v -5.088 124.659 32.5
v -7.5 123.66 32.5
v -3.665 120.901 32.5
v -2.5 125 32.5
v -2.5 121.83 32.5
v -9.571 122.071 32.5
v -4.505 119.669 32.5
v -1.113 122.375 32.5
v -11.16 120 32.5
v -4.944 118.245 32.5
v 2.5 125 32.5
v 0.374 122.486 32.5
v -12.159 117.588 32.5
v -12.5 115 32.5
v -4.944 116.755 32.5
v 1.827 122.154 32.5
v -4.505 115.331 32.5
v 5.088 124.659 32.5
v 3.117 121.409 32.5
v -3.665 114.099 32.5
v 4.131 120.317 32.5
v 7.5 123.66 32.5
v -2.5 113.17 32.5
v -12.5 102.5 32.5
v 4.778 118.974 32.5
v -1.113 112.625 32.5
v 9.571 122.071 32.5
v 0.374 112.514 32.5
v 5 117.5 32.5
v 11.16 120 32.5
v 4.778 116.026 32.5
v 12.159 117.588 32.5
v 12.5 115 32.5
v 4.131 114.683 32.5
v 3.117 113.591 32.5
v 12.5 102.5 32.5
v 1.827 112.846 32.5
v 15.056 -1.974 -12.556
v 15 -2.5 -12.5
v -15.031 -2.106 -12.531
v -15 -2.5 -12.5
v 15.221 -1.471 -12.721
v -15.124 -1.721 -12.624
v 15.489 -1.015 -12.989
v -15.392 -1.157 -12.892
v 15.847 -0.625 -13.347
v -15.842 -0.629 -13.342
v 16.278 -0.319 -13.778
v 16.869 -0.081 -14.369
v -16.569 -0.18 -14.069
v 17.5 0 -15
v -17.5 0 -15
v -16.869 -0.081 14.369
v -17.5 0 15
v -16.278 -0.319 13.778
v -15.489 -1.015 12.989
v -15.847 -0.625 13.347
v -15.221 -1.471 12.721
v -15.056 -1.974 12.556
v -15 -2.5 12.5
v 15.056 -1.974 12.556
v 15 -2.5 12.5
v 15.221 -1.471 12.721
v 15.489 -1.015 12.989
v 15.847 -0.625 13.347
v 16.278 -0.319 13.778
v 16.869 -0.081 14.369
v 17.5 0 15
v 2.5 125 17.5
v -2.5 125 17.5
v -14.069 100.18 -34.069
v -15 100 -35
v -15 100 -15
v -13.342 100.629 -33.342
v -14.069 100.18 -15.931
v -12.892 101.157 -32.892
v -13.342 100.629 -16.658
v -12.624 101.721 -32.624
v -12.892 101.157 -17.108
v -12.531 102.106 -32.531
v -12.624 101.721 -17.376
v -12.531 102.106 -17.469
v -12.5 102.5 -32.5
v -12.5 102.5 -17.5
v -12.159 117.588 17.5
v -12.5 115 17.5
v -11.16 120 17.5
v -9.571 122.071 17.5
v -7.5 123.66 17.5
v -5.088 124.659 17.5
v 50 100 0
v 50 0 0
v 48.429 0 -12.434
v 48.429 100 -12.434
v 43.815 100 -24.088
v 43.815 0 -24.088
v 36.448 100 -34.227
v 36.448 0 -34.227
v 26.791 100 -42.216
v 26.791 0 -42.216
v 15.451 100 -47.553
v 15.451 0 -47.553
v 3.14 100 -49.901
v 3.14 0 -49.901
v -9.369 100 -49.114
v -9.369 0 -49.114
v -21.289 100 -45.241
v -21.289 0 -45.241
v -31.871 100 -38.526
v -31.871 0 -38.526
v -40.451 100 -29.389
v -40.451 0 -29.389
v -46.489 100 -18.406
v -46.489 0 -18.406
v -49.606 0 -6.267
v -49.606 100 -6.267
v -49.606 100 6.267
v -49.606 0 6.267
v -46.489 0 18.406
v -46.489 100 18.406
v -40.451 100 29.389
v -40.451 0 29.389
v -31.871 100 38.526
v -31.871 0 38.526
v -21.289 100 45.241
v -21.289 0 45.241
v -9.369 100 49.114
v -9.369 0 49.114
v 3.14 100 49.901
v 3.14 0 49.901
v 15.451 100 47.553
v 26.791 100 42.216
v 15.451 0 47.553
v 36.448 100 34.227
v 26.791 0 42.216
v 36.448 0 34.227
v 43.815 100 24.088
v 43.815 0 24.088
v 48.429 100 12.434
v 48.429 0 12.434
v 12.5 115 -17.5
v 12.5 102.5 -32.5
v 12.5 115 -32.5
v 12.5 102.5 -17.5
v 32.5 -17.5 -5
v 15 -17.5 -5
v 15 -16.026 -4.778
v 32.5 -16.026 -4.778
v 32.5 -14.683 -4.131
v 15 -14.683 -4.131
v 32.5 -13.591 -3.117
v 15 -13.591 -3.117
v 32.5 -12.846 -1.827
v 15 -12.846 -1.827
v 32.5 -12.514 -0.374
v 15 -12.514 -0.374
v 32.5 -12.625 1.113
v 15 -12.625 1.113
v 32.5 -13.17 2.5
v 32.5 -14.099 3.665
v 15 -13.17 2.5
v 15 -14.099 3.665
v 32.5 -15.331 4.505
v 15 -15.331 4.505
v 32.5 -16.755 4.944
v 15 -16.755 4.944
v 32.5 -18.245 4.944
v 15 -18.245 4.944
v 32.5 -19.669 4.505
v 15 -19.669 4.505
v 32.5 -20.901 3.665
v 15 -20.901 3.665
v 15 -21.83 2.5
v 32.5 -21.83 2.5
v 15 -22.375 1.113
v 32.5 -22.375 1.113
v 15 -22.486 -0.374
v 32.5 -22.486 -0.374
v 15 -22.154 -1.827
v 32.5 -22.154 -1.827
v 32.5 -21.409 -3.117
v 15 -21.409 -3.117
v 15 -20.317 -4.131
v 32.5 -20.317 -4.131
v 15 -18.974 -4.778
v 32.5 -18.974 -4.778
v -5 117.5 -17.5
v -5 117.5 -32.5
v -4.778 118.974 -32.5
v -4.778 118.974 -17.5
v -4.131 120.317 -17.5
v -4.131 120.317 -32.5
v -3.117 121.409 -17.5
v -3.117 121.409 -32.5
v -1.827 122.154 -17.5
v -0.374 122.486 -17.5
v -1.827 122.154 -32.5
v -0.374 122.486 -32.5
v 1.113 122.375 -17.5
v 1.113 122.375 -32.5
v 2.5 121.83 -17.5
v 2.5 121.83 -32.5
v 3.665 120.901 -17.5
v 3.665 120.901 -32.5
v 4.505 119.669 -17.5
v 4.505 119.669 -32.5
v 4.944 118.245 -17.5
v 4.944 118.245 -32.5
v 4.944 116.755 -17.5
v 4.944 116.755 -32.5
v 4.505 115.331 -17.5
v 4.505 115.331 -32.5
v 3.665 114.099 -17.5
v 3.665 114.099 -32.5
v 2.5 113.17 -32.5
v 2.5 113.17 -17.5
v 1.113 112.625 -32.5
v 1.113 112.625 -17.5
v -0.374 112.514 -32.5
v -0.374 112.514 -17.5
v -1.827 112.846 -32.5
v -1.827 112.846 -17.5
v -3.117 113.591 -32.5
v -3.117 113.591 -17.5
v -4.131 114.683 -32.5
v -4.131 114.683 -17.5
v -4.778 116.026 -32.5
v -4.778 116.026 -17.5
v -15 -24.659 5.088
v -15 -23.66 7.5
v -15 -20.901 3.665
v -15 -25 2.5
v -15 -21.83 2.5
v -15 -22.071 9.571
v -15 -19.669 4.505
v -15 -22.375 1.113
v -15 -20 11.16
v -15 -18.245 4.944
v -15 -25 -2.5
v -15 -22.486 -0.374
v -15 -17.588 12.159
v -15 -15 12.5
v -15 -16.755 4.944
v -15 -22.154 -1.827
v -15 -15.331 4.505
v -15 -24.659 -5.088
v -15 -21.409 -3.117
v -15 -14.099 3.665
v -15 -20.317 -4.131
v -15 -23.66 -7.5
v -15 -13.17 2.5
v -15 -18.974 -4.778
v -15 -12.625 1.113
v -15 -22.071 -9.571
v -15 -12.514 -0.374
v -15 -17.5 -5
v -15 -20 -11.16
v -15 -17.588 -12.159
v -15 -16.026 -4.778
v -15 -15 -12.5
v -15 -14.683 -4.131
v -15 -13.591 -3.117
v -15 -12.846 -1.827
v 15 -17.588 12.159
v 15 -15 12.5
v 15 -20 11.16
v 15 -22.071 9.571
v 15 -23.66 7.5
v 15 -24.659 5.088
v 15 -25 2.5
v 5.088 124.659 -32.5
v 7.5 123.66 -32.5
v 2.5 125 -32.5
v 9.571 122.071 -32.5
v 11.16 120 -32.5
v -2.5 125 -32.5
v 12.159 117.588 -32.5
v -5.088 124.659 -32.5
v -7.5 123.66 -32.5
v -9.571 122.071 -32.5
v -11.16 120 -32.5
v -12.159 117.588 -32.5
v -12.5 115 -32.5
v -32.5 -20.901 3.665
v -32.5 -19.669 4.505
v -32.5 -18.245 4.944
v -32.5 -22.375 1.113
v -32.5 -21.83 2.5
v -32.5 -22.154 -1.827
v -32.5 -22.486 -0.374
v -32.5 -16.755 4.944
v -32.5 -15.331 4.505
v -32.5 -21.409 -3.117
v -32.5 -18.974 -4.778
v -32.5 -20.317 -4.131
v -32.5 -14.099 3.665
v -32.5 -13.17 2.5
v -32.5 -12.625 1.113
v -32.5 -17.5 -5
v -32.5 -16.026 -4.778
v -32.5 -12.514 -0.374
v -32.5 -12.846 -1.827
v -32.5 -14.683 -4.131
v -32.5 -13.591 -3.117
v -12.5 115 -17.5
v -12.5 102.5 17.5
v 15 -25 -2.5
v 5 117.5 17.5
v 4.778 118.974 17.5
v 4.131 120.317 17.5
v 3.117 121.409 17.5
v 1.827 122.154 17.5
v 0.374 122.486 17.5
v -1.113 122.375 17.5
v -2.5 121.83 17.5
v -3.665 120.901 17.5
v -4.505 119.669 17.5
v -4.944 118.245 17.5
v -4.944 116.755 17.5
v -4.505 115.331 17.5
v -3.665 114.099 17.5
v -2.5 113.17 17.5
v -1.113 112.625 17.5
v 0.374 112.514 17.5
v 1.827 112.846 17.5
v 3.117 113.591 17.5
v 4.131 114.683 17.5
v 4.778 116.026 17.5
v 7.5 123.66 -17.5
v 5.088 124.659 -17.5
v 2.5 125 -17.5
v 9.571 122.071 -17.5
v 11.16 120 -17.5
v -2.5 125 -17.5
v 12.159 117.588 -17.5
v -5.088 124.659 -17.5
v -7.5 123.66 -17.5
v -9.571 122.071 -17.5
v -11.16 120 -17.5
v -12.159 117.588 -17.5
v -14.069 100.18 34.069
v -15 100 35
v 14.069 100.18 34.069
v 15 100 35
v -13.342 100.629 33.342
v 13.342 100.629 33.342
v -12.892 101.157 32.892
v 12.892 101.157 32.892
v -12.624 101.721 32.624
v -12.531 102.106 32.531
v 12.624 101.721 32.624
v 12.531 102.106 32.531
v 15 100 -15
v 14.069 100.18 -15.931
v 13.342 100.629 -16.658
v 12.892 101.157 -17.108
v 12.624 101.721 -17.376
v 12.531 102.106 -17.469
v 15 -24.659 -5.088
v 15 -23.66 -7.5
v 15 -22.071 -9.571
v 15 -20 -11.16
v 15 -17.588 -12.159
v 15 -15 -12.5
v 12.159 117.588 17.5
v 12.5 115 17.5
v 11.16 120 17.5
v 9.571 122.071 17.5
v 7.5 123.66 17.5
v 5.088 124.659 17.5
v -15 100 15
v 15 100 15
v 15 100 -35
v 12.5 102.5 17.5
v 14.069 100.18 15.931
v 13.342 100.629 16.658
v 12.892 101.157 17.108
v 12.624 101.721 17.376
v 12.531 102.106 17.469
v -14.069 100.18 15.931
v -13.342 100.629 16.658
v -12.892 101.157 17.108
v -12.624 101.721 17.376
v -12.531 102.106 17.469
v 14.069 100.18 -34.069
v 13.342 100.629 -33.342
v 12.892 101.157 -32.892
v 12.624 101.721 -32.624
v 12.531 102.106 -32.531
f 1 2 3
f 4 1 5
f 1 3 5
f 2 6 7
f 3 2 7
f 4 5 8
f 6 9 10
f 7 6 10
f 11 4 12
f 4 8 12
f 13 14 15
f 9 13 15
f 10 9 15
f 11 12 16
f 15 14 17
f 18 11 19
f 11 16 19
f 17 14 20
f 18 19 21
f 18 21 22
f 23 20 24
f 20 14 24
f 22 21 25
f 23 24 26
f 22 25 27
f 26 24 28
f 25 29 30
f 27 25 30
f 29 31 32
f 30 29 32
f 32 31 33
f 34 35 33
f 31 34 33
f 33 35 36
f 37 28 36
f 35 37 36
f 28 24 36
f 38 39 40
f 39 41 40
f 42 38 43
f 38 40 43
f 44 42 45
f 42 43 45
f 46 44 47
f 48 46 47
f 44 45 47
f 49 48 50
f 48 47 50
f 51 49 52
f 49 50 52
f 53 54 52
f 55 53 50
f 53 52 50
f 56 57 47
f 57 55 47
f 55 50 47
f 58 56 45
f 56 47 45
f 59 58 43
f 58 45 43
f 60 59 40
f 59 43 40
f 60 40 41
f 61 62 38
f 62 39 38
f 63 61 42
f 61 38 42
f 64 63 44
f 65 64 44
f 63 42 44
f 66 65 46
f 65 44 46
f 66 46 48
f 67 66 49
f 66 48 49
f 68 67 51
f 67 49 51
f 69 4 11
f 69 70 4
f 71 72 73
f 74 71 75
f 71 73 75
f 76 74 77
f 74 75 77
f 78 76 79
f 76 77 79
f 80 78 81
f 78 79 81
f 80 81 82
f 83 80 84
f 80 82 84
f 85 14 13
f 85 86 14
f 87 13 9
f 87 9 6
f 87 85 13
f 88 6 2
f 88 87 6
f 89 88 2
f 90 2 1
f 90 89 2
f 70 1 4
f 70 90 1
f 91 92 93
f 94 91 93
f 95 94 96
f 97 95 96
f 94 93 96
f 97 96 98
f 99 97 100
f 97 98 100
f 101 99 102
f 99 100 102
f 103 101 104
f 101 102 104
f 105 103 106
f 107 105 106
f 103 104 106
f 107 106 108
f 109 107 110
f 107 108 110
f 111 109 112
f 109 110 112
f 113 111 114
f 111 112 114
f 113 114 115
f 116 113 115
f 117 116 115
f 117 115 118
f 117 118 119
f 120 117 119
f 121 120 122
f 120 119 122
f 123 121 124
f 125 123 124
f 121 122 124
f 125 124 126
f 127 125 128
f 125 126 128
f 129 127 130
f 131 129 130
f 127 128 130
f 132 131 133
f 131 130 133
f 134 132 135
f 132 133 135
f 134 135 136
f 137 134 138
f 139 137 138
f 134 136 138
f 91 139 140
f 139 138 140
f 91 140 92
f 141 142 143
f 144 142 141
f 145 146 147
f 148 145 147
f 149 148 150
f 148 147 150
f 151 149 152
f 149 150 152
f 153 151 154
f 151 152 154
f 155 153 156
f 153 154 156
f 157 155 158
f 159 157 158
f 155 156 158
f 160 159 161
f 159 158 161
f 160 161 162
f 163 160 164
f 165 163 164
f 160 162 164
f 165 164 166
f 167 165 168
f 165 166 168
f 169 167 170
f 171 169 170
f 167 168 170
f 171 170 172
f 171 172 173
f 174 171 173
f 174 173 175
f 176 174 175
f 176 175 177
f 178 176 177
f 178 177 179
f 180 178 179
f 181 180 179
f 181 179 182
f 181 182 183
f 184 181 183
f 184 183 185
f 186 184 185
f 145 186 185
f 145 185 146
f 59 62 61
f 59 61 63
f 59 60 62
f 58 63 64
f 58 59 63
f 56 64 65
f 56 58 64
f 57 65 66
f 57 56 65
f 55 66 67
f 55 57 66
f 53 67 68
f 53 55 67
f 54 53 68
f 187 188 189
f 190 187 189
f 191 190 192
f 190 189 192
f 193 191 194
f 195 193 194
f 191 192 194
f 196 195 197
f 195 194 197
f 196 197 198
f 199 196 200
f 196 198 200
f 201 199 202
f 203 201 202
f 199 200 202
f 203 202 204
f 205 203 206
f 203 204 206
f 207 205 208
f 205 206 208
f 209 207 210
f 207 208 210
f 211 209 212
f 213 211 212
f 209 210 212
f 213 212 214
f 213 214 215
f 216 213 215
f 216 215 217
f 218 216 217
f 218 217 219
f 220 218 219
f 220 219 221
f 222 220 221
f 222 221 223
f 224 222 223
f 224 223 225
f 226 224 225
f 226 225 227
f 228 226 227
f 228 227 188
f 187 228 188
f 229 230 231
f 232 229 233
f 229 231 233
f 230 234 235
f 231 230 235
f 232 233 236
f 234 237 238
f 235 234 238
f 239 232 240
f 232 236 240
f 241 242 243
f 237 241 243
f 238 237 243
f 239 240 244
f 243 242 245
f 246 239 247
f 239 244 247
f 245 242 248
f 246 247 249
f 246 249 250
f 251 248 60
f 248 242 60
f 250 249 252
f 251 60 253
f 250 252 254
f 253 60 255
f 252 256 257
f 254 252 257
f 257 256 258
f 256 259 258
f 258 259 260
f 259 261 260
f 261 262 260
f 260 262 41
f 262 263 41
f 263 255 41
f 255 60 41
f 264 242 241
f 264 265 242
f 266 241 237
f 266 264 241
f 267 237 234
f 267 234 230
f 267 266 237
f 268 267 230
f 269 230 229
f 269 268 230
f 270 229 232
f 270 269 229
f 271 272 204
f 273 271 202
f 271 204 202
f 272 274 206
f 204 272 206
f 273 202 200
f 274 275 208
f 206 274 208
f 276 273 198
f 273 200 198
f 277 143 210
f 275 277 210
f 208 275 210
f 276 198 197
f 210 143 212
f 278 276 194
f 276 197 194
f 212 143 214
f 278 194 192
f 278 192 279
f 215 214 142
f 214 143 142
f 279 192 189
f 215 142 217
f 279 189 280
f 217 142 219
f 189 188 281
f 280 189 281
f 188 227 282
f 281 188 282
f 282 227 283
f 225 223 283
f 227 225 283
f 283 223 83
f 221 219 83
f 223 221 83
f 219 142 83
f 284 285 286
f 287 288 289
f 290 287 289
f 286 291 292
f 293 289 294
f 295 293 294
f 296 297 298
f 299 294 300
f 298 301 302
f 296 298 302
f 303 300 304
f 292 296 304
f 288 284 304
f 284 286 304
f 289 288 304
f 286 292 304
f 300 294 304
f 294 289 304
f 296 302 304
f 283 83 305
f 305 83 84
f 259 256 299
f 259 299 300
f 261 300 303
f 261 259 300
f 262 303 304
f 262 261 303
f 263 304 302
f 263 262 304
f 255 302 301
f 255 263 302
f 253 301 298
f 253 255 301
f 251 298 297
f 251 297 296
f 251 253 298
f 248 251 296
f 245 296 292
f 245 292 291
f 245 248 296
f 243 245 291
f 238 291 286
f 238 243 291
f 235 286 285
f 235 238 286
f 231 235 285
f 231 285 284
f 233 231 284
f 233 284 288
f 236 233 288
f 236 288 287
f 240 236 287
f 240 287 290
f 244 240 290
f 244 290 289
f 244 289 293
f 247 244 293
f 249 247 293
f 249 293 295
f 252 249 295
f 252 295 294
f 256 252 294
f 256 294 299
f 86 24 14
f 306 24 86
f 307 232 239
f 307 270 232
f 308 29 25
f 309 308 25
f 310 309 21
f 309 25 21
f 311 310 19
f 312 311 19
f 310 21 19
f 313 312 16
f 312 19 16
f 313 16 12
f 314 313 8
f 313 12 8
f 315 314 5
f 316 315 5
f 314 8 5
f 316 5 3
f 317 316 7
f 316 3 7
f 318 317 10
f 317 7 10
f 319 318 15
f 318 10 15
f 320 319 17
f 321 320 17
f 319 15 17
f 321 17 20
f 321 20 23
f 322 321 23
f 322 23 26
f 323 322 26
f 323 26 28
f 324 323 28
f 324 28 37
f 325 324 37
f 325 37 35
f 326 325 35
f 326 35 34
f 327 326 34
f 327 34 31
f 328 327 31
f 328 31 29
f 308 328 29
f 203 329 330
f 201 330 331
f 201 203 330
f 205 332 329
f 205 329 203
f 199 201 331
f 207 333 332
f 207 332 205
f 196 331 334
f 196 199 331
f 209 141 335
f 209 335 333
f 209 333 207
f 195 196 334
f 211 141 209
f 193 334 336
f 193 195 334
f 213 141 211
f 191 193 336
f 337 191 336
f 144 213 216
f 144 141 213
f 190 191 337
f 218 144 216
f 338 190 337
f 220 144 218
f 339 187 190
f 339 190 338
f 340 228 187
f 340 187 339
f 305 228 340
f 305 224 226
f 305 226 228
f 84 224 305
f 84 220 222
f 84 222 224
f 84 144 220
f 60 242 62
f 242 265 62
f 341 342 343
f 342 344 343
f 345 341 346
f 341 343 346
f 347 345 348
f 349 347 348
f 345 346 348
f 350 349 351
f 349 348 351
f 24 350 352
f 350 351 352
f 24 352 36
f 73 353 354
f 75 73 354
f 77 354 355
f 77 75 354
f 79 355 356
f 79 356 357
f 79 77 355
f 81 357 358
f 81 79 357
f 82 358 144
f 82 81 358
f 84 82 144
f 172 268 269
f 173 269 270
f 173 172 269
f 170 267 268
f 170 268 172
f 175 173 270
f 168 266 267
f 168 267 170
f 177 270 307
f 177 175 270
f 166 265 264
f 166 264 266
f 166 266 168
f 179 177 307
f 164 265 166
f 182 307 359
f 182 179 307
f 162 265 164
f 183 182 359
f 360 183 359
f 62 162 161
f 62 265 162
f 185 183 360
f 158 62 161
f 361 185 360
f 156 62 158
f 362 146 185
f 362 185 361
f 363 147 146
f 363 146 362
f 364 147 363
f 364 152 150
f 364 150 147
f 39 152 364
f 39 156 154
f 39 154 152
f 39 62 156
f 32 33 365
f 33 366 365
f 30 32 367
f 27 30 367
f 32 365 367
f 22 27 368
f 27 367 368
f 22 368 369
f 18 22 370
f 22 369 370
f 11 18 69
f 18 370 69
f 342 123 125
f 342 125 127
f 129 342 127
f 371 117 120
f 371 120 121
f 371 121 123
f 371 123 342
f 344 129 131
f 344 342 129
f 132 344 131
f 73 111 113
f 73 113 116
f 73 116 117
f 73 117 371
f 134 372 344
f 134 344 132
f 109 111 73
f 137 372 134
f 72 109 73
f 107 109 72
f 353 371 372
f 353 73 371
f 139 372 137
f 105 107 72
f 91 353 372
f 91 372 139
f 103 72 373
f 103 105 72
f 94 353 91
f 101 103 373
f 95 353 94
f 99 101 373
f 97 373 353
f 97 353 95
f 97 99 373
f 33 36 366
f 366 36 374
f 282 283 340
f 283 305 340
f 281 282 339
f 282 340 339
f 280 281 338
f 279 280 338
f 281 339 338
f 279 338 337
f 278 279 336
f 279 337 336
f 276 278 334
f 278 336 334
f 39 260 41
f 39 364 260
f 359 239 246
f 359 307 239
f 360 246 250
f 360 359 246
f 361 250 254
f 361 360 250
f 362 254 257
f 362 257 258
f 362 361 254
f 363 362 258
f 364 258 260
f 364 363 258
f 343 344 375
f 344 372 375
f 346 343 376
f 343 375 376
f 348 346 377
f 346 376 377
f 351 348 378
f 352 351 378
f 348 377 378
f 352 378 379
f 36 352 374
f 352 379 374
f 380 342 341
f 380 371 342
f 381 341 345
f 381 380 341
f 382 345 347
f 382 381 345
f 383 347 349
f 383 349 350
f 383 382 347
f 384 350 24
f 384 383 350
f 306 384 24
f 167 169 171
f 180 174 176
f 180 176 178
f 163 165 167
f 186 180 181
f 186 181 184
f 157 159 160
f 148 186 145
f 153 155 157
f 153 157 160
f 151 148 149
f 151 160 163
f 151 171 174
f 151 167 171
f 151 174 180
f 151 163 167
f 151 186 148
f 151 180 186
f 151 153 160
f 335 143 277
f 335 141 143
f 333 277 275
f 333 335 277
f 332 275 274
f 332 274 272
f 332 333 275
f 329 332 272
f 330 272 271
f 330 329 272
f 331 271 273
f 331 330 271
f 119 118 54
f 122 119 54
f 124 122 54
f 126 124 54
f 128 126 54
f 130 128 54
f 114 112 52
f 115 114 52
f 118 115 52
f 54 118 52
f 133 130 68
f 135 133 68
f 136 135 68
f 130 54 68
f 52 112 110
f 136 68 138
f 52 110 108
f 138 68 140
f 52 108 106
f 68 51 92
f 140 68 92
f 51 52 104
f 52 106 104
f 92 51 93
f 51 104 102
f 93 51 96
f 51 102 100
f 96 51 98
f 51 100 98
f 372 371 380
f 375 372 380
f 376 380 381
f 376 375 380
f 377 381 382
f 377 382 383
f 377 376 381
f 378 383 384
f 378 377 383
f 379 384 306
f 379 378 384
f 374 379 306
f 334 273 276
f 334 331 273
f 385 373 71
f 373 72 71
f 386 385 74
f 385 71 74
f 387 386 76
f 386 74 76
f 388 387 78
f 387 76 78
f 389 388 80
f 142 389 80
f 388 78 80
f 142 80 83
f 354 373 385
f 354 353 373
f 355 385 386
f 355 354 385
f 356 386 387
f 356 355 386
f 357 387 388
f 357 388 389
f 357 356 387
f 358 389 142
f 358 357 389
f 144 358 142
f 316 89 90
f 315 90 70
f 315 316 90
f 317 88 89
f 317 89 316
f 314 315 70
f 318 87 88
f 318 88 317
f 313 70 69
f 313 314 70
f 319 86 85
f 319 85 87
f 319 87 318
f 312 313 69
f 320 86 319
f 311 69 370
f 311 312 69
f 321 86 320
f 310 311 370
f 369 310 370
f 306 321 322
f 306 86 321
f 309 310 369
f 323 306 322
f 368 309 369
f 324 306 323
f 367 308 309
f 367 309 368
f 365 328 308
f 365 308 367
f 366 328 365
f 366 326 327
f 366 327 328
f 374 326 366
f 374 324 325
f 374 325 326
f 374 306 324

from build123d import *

# Parameters (mm, degrees)
SKETCH1_R                = 50
BOSS_EXTRUDE1_DEPTH      = 100
SKETCH6_W                = 25
SKETCH6_H                = 15
BOSS_EXTRUDE3_DEPTH      = 25
FILLET3_R                = 2.5
FILLET4_R                = 10
SKETCH7_R                = 5
CUT_EXTRUDE2_DEPTH       = 25
CIRPATTERN1_COUNT        = 2
FILLET3_OF_CIRPATTERN1_R = 2.5
FILLET4_OF_CIRPATTERN1_R = 10
SKETCH9_W                = 25
SKETCH9_H                = 25
BOSS_EXTRUDE4_DEPTH      = 15
BOSS_EXTRUDE4_DEPTH_BACK = 15
FILLET5_R                = 2.5
FILLET6_R                = 10
SKETCH10_R               = 5
BOSS_EXTRUDE5_DEPTH      = 32.5
BOSS_EXTRUDE5_DEPTH_BACK = 32.5


with BuildPart() as part:
    # Sketch1 → Boss-Extrude1 (new body)
    with BuildSketch(Plane(origin=(0, 0, 0), x_dir=(1, 0, 0), z_dir=(0, 1, 0))):
        Circle(SKETCH1_R)
    extrude(amount=BOSS_EXTRUDE1_DEPTH)

    # Sketch6 → Boss-Extrude3 (add)
    with BuildSketch(Plane(origin=(0, 100, 0), x_dir=(1, 0, 0), z_dir=(0, 1, 0))):
        with Locations((0, -25)):
            Rectangle(SKETCH6_W, SKETCH6_H)
    boss_extrude3 = extrude(amount=BOSS_EXTRUDE3_DEPTH)

    # Fillet3
    fillet3_edges = [part.edges().sort_by_distance(p)[0] for p in [
        (12.5, 100, 25),
        (0, 100, 17.5),
        (-12.5, 100, 25),
        (0, 100, 32.5),
    ]]
    fillet(fillet3_edges, radius=FILLET3_R)

    # Fillet4
    fillet4_edges = [part.edges().sort_by_distance(p)[0] for p in [
        (12.5, 125, 25),
        (-12.5, 125, 25),
    ]]
    fillet(fillet4_edges, radius=FILLET4_R)

    # Sketch7 → Cut-Extrude2 (cut)
    with BuildSketch(Plane.XY.offset(32.5)):
        with Locations((0, 117.5)):
            Circle(SKETCH7_R)
    cut_extrude2 = extrude(amount=-CUT_EXTRUDE2_DEPTH, mode=Mode.SUBTRACT)

    # CirPattern1: Boss-Extrude3, Cut-Extrude2 ×2 about axis
    cirpattern1_axis = Axis((0, 0, 0), (0, 1, 0))
    for i in range(1, CIRPATTERN1_COUNT):
        add(boss_extrude3.rotate(cirpattern1_axis, i * 360 / CIRPATTERN1_COUNT))
        add(cut_extrude2.rotate(cirpattern1_axis, i * 360 / CIRPATTERN1_COUNT), mode=Mode.SUBTRACT)

    # Fillet3 of CirPattern1
    fillet3_of_cirpattern1_edges = [part.edges().sort_by_distance(p)[0] for p in [
        (-12.5, 100, -25),
        (0, 100, -17.5),
        (12.5, 100, -25),
        (0, 100, -32.5),
    ]]
    fillet(fillet3_of_cirpattern1_edges, radius=FILLET3_OF_CIRPATTERN1_R)

    # Fillet4 of CirPattern1
    fillet4_of_cirpattern1_edges = [part.edges().sort_by_distance(p)[0] for p in [
        (-12.5, 125, -25),
        (12.5, 125, -25),
    ]]
    fillet(fillet4_of_cirpattern1_edges, radius=FILLET4_OF_CIRPATTERN1_R)

    # Sketch9 → Boss-Extrude4 (add, two sides)
    with BuildSketch(Plane(origin=(0, 0, 0), x_dir=(0, 0, -1), z_dir=(1, 0, 0))) as boss_extrude4_sk:
        with Locations((0, -12.5)):
            Rectangle(SKETCH9_W, SKETCH9_H)
    extrude(amount=BOSS_EXTRUDE4_DEPTH)
    extrude(boss_extrude4_sk.sketch, amount=-BOSS_EXTRUDE4_DEPTH_BACK)

    # Fillet5
    fillet5_edges = [part.edges().sort_by_distance(p)[0] for p in [
        (0, 0, 12.5),
        (-15, 0, 0),
        (0, 0, -12.5),
        (15, 0, 0),
    ]]
    fillet(fillet5_edges, radius=FILLET5_R)

    # Fillet6
    fillet6_edges = [part.edges().sort_by_distance(p)[0] for p in [
        (0, -25, 12.5),
        (0, -25, -12.5),
    ]]
    fillet(fillet6_edges, radius=FILLET6_R)

    # Sketch10 → Boss-Extrude5 (add, two sides)
    with BuildSketch(Plane(origin=(0, 0, 0), x_dir=(0, 0, -1), z_dir=(1, 0, 0))) as boss_extrude5_sk:
        with Locations((0, -17.5)):
            Circle(SKETCH10_R)
    extrude(amount=BOSS_EXTRUDE5_DEPTH)
    extrude(boss_extrude5_sk.sketch, amount=-BOSS_EXTRUDE5_DEPTH_BACK)


solid = part.part
